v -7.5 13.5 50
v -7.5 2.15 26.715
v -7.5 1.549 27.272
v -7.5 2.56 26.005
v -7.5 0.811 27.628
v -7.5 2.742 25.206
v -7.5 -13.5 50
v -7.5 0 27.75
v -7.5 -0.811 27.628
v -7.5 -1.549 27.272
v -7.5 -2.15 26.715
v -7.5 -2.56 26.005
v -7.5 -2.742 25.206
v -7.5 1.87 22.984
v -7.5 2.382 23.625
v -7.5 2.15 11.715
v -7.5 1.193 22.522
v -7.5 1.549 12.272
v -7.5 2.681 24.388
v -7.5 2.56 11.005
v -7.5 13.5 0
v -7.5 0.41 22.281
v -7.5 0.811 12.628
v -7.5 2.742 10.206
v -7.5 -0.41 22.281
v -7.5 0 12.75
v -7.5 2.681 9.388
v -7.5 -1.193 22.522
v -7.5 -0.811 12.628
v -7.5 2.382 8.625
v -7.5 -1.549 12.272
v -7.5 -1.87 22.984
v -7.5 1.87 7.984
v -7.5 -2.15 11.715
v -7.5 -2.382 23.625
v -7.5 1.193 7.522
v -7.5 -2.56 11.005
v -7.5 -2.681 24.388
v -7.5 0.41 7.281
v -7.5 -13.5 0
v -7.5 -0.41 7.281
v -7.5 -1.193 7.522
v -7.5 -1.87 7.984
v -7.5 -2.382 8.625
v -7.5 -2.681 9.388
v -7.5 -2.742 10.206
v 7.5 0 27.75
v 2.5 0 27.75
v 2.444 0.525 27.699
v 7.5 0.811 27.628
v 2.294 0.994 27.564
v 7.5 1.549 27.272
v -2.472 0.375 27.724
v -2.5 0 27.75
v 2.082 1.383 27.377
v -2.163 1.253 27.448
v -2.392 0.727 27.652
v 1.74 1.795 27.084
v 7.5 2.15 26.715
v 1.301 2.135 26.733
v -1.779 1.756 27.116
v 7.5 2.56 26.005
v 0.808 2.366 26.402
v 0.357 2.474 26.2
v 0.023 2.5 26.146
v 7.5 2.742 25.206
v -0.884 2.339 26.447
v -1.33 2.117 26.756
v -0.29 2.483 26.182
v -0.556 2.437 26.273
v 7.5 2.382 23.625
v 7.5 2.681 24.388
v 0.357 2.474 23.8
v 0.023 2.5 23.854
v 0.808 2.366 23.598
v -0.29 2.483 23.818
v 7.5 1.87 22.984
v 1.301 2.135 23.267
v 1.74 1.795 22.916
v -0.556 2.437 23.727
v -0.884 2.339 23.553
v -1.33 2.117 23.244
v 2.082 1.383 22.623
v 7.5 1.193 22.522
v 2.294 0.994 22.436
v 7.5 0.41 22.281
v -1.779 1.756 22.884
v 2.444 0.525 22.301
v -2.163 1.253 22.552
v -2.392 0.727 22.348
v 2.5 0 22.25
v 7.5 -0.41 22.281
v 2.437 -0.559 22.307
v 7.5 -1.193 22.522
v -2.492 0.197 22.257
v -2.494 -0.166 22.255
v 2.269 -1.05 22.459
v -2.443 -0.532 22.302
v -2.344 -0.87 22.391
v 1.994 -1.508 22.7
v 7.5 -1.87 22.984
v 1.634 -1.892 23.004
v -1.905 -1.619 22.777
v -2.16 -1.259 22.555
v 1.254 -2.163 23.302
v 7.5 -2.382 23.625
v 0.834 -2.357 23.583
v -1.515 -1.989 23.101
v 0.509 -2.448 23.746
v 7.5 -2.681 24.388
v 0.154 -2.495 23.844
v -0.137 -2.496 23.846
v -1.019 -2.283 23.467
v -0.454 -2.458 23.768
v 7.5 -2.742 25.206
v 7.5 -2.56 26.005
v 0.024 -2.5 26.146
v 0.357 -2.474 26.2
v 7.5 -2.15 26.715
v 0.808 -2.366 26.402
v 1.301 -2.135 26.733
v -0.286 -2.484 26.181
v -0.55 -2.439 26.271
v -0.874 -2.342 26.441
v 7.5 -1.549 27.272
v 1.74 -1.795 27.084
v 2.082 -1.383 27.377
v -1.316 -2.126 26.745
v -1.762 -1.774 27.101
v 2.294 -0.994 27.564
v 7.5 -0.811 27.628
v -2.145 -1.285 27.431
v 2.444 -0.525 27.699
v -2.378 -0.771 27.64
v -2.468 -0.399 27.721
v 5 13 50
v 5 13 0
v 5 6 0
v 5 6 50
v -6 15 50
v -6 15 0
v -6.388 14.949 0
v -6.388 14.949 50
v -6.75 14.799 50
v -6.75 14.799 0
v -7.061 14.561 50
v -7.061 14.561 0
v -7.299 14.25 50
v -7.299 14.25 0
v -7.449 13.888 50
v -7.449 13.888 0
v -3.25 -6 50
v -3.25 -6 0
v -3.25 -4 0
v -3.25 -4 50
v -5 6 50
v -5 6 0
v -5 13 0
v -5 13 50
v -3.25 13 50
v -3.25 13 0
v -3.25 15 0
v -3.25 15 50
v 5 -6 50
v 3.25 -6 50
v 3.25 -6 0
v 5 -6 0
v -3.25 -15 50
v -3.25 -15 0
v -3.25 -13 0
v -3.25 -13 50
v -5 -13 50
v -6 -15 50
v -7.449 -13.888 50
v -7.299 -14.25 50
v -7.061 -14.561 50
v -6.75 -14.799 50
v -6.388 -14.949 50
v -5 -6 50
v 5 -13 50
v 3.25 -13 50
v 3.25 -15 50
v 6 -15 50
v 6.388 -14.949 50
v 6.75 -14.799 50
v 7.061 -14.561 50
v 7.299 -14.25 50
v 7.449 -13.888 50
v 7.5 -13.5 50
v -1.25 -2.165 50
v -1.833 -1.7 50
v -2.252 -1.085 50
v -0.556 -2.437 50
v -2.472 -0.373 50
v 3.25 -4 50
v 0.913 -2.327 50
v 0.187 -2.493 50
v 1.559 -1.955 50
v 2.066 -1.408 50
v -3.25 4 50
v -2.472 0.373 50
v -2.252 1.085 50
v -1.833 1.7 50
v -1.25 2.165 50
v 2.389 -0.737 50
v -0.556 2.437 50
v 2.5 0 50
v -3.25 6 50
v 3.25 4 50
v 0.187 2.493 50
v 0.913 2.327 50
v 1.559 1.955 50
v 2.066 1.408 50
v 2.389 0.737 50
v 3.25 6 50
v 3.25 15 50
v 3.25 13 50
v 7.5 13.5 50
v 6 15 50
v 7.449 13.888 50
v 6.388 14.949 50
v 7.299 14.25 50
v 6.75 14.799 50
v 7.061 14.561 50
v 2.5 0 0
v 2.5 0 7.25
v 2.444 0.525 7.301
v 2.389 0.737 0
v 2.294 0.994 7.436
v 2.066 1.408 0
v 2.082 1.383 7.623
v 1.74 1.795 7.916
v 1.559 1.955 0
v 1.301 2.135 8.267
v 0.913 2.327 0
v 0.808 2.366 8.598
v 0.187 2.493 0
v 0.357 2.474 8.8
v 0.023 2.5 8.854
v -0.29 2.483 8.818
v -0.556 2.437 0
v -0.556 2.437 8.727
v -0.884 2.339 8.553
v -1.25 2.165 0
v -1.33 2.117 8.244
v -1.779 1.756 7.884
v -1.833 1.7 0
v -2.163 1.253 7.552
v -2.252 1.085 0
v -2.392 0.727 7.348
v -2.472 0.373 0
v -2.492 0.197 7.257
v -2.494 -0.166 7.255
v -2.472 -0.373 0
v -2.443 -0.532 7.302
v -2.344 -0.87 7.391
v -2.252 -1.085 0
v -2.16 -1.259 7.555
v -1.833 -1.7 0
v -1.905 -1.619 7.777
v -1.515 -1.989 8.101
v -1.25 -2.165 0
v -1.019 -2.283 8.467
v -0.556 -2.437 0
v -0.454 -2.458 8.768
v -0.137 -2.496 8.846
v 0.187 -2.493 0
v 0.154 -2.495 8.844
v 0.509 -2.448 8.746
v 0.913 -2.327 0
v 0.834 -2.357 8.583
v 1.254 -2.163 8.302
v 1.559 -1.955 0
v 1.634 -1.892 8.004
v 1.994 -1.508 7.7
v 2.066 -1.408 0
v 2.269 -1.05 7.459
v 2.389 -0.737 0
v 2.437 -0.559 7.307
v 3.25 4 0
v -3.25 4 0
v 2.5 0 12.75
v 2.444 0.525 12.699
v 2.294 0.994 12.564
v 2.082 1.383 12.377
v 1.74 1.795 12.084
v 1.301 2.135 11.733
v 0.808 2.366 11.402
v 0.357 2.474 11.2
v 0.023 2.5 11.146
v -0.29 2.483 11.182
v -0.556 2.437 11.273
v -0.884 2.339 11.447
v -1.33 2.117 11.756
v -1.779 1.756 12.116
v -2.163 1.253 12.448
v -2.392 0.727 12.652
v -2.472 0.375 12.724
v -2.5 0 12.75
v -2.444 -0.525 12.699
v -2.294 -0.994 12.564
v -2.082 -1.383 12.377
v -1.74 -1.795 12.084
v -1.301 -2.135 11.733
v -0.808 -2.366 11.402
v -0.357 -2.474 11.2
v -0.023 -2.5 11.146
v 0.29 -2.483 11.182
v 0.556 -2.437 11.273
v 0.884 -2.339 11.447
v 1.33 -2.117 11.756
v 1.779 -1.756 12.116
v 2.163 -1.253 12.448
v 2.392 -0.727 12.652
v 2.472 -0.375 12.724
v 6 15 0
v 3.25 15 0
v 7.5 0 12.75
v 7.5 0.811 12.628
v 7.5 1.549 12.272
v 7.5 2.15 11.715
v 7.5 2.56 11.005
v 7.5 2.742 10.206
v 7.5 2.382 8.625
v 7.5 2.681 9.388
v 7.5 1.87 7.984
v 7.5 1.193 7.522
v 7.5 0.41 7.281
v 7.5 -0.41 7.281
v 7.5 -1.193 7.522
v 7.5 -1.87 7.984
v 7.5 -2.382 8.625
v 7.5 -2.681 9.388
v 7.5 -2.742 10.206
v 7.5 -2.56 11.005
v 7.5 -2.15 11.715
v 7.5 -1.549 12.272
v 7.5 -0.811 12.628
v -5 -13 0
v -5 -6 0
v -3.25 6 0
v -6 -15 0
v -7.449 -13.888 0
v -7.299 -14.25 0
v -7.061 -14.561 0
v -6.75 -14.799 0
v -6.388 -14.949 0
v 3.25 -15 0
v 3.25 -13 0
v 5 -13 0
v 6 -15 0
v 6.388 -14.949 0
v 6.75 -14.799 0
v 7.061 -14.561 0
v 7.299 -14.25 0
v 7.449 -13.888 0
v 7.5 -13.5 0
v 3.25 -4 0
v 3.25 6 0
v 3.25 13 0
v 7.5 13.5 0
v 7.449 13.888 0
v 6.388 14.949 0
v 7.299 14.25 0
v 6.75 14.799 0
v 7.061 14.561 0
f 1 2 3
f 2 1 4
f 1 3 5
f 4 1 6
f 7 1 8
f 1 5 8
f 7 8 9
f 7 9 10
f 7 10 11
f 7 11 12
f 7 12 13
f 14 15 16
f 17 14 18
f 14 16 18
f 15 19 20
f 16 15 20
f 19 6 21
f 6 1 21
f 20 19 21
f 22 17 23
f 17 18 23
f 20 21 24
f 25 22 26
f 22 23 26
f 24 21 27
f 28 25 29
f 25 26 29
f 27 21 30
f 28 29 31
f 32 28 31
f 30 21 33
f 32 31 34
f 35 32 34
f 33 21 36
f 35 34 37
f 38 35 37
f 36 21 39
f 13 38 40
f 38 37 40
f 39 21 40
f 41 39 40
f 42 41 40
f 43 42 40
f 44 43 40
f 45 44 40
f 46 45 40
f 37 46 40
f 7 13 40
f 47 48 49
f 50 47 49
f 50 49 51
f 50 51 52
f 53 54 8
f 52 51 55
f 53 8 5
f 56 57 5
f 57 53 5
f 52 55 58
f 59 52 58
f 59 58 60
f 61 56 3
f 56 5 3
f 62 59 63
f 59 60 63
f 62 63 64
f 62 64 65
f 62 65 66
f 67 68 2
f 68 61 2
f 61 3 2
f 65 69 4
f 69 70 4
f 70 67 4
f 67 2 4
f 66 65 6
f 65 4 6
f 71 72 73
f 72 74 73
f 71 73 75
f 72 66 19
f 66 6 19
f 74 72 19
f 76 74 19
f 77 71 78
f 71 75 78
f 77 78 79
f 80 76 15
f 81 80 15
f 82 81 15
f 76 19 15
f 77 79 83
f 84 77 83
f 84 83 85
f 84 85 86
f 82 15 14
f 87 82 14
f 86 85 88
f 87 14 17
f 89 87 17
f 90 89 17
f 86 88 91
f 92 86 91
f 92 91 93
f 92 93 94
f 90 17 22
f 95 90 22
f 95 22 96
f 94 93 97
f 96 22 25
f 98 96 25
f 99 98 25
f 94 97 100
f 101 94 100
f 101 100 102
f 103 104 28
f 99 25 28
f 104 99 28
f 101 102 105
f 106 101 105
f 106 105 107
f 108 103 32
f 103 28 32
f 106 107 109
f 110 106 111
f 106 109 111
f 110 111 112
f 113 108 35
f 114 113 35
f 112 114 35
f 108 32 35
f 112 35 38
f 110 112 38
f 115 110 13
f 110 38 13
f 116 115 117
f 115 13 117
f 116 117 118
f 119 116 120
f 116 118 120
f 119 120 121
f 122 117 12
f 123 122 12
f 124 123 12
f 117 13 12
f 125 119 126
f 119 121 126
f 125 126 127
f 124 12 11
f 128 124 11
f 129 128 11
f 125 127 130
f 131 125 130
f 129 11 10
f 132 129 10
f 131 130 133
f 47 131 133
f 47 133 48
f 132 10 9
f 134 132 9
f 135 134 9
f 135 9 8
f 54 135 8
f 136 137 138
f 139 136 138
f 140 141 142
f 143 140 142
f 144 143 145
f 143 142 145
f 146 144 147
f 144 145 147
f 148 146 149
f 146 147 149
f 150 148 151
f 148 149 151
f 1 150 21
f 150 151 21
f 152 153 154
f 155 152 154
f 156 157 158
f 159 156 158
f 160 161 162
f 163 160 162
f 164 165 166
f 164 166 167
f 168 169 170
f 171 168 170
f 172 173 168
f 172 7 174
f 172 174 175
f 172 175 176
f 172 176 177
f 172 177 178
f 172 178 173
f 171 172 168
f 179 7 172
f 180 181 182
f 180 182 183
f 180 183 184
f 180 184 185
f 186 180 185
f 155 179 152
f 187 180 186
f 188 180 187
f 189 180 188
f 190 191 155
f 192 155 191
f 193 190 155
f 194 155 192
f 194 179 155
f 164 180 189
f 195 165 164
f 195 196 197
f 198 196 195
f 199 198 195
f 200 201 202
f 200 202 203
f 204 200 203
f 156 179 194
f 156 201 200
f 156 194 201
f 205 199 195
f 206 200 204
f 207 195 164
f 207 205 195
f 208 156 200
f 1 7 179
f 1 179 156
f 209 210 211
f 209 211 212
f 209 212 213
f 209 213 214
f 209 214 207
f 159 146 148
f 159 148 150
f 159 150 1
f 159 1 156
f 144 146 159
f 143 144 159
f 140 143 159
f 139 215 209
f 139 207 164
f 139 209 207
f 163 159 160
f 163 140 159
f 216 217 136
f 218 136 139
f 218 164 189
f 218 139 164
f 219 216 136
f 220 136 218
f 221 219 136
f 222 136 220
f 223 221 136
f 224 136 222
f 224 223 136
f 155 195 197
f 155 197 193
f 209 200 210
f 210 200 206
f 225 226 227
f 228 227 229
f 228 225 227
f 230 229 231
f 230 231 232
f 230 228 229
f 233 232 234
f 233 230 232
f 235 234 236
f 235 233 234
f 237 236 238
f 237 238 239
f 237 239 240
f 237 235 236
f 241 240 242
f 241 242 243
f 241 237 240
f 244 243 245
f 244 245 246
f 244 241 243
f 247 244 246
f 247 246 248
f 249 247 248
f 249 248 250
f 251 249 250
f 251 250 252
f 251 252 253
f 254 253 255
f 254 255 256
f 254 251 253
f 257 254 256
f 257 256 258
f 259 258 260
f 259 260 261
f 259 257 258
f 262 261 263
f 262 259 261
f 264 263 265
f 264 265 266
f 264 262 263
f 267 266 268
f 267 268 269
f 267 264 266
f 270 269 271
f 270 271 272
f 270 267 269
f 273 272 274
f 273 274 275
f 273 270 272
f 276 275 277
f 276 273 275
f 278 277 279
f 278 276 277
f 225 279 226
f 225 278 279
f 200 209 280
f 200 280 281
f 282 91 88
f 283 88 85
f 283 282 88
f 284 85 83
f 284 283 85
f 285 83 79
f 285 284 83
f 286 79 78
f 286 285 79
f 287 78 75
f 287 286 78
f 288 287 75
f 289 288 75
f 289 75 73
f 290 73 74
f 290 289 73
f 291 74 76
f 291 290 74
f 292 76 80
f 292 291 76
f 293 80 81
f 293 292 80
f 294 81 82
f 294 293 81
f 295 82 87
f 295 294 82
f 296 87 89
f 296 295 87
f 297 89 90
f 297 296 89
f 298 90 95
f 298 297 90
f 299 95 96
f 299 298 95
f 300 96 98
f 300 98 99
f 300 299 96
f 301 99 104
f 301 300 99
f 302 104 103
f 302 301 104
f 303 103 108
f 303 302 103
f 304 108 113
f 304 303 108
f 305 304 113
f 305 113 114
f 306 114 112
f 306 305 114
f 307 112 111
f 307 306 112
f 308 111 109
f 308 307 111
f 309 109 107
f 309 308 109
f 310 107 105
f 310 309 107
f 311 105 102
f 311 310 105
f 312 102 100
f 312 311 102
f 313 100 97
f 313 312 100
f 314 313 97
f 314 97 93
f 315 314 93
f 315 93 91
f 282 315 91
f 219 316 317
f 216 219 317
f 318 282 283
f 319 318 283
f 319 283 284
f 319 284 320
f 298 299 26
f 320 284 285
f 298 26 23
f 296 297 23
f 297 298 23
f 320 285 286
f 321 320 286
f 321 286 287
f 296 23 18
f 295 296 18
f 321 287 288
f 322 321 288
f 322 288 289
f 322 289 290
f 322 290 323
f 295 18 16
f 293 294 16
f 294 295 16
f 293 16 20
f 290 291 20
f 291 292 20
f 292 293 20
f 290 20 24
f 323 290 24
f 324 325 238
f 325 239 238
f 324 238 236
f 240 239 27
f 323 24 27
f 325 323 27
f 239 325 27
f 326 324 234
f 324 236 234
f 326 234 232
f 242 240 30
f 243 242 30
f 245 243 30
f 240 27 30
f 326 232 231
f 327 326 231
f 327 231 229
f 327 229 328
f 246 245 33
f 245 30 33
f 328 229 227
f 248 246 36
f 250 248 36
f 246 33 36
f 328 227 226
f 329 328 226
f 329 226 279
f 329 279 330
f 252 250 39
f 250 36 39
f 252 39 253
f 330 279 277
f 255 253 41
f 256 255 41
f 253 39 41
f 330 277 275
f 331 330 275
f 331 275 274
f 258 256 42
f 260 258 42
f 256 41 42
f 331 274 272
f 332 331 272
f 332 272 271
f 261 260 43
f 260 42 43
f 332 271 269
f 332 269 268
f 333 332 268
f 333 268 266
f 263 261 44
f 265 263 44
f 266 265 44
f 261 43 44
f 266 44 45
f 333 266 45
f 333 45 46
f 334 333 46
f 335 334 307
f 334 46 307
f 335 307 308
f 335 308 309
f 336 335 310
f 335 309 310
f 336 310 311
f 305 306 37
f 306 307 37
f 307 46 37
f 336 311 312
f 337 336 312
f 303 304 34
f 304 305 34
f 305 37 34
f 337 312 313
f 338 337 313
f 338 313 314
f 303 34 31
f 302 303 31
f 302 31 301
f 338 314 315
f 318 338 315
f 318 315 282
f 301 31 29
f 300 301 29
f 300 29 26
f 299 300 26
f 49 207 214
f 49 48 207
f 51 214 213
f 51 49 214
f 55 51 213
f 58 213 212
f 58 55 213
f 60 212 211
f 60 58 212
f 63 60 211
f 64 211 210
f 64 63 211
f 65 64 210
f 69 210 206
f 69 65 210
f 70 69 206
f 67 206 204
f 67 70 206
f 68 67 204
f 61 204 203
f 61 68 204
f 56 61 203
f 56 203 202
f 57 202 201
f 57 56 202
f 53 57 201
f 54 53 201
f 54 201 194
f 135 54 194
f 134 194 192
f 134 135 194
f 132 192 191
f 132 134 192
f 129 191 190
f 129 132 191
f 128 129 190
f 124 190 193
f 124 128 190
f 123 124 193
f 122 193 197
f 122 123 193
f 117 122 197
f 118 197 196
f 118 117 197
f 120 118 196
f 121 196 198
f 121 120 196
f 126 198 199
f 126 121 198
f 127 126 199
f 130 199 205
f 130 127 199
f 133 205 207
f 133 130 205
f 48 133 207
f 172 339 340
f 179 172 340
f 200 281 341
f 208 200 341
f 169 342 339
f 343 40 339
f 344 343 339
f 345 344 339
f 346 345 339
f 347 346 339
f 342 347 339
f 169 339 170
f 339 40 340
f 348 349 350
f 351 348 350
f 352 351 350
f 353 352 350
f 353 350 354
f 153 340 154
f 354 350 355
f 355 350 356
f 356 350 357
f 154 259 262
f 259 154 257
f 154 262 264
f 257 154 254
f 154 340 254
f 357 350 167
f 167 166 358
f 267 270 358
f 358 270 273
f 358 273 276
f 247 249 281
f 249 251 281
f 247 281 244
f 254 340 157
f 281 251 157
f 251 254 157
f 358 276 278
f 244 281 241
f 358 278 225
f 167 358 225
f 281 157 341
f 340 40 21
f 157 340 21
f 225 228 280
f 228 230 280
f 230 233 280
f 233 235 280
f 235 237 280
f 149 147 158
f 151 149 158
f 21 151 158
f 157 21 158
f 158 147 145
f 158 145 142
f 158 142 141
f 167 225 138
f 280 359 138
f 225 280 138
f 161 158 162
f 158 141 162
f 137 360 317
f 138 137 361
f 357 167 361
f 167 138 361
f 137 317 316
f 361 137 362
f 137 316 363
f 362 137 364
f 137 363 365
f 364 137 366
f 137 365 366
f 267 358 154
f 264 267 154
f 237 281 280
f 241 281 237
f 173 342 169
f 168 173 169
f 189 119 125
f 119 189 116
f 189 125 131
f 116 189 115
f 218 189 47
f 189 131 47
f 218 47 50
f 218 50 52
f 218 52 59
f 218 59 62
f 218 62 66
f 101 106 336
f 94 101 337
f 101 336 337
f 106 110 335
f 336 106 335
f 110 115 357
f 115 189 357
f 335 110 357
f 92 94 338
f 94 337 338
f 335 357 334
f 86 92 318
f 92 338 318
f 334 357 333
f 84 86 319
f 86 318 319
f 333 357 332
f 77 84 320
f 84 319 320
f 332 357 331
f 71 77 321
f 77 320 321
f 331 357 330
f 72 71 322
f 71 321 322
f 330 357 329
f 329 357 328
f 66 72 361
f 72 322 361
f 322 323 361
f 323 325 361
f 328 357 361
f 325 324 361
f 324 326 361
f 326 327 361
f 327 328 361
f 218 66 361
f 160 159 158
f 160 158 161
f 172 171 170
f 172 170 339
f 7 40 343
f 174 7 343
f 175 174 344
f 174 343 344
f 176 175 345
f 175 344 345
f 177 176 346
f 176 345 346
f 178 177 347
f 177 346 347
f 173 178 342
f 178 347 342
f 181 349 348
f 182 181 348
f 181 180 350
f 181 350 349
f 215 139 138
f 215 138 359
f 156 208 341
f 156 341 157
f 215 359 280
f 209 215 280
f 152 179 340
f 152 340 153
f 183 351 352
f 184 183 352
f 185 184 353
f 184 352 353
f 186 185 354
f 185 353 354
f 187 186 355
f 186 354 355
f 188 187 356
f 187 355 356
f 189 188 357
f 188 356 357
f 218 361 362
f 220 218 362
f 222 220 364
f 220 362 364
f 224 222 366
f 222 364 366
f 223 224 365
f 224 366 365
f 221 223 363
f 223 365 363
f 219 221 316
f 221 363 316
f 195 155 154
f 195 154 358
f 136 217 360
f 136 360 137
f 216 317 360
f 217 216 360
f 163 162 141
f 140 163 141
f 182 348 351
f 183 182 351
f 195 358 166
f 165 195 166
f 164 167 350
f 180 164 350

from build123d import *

# Parameters (mm, degrees)
SKETCH1_R               = 2.5
EXTRUDE_1_DEPTH         = 50
HOLE_WIZARD_5_5_5_5_1_D = 5.5
HOLE_WIZARD_5_5_5_5_2_D = 5.5


with BuildPart() as part:
    # Sketch1 → 凸台-拉伸1 (new body)
    with BuildSketch(Plane.XY):
        with BuildLine():
            Line((-6, -15), (-3.25, -15))
            Line((-3.25, -15), (-3.25, -13))
            Line((-3.25, -13), (-5, -13))
            Line((-5, -13), (-5, -6))
            Line((-5, -6), (-3.25, -6))
            Line((-3.25, -6), (-3.25, -4))
            Line((-3.25, -4), (3.25, -4))
            Line((3.25, -4), (3.25, -6))
            Line((3.25, -6), (5, -6))
            Line((5, -6), (5, -13))
            Line((5, -13), (3.25, -13))
            Line((3.25, -13), (3.25, -15))
            Line((3.25, -15), (6, -15))
            ThreePointArc((6, -15), (7.060660172, -14.560660172), (7.5, -13.5))
            Line((7.5, -13.5), (7.5, 13.5))
            ThreePointArc((7.5, 13.5), (7.060660172, 14.560660172), (6, 15))
            Line((6, 15), (3.25, 15))
            Line((3.25, 15), (3.25, 13))
            Line((3.25, 13), (5, 13))
            Line((5, 13), (5, 6))
            Line((5, 6), (3.25, 6))
            Line((3.25, 6), (3.25, 4))
            Line((3.25, 4), (-3.25, 4))
            Line((-3.25, 4), (-3.25, 6))
            Line((-3.25, 6), (-5, 6))
            Line((-5, 6), (-5, 13))
            Line((-5, 13), (-3.25, 13))
            Line((-3.25, 13), (-3.25, 15))
            Line((-3.25, 15), (-6, 15))
            ThreePointArc((-6, 15), (-7.060660172, 14.560660172), (-7.5, 13.5))
            Line((-7.5, 13.5), (-7.5, -13.5))
            ThreePointArc((-7.5, -13.5), (-7.060660172, -14.560660172), (-6, -15))
        make_face()
        Circle(SKETCH1_R, mode=Mode.SUBTRACT)
    extrude(amount=EXTRUDE_1_DEPTH)

    # Ø5.5 (5.5) 直径孔1 (through all)
    with Locations(Plane(origin=(7.5, 0, 0), x_dir=(0, 0, -1), z_dir=(1, 0, 0))):
        with Locations((-25, 0)):
            Hole(HOLE_WIZARD_5_5_5_5_1_D / 2)

    # Ø5.5 (5.5) 直径孔2 (through all)
    with Locations(Plane(origin=(7.5, 0, 0), x_dir=(0, 0, -1), z_dir=(1, 0, 0))):
        with Locations((-10, 0)):
            Hole(HOLE_WIZARD_5_5_5_5_2_D / 2)

    # 草图6 → M6 螺纹孔1 (revolve, cut)
    with BuildSketch(Plane(origin=(0, 0, 50), x_dir=(0, -1, 0), z_dir=(1, 0, 0))):
        Polygon((0, 0), (0, 26.502151548), (2.5, 25), (2.5, 0), align=None)
    revolve(axis=Axis((0, 0, 56.35), (0, 0, -1)), mode=Mode.SUBTRACT)


solid = part.part
